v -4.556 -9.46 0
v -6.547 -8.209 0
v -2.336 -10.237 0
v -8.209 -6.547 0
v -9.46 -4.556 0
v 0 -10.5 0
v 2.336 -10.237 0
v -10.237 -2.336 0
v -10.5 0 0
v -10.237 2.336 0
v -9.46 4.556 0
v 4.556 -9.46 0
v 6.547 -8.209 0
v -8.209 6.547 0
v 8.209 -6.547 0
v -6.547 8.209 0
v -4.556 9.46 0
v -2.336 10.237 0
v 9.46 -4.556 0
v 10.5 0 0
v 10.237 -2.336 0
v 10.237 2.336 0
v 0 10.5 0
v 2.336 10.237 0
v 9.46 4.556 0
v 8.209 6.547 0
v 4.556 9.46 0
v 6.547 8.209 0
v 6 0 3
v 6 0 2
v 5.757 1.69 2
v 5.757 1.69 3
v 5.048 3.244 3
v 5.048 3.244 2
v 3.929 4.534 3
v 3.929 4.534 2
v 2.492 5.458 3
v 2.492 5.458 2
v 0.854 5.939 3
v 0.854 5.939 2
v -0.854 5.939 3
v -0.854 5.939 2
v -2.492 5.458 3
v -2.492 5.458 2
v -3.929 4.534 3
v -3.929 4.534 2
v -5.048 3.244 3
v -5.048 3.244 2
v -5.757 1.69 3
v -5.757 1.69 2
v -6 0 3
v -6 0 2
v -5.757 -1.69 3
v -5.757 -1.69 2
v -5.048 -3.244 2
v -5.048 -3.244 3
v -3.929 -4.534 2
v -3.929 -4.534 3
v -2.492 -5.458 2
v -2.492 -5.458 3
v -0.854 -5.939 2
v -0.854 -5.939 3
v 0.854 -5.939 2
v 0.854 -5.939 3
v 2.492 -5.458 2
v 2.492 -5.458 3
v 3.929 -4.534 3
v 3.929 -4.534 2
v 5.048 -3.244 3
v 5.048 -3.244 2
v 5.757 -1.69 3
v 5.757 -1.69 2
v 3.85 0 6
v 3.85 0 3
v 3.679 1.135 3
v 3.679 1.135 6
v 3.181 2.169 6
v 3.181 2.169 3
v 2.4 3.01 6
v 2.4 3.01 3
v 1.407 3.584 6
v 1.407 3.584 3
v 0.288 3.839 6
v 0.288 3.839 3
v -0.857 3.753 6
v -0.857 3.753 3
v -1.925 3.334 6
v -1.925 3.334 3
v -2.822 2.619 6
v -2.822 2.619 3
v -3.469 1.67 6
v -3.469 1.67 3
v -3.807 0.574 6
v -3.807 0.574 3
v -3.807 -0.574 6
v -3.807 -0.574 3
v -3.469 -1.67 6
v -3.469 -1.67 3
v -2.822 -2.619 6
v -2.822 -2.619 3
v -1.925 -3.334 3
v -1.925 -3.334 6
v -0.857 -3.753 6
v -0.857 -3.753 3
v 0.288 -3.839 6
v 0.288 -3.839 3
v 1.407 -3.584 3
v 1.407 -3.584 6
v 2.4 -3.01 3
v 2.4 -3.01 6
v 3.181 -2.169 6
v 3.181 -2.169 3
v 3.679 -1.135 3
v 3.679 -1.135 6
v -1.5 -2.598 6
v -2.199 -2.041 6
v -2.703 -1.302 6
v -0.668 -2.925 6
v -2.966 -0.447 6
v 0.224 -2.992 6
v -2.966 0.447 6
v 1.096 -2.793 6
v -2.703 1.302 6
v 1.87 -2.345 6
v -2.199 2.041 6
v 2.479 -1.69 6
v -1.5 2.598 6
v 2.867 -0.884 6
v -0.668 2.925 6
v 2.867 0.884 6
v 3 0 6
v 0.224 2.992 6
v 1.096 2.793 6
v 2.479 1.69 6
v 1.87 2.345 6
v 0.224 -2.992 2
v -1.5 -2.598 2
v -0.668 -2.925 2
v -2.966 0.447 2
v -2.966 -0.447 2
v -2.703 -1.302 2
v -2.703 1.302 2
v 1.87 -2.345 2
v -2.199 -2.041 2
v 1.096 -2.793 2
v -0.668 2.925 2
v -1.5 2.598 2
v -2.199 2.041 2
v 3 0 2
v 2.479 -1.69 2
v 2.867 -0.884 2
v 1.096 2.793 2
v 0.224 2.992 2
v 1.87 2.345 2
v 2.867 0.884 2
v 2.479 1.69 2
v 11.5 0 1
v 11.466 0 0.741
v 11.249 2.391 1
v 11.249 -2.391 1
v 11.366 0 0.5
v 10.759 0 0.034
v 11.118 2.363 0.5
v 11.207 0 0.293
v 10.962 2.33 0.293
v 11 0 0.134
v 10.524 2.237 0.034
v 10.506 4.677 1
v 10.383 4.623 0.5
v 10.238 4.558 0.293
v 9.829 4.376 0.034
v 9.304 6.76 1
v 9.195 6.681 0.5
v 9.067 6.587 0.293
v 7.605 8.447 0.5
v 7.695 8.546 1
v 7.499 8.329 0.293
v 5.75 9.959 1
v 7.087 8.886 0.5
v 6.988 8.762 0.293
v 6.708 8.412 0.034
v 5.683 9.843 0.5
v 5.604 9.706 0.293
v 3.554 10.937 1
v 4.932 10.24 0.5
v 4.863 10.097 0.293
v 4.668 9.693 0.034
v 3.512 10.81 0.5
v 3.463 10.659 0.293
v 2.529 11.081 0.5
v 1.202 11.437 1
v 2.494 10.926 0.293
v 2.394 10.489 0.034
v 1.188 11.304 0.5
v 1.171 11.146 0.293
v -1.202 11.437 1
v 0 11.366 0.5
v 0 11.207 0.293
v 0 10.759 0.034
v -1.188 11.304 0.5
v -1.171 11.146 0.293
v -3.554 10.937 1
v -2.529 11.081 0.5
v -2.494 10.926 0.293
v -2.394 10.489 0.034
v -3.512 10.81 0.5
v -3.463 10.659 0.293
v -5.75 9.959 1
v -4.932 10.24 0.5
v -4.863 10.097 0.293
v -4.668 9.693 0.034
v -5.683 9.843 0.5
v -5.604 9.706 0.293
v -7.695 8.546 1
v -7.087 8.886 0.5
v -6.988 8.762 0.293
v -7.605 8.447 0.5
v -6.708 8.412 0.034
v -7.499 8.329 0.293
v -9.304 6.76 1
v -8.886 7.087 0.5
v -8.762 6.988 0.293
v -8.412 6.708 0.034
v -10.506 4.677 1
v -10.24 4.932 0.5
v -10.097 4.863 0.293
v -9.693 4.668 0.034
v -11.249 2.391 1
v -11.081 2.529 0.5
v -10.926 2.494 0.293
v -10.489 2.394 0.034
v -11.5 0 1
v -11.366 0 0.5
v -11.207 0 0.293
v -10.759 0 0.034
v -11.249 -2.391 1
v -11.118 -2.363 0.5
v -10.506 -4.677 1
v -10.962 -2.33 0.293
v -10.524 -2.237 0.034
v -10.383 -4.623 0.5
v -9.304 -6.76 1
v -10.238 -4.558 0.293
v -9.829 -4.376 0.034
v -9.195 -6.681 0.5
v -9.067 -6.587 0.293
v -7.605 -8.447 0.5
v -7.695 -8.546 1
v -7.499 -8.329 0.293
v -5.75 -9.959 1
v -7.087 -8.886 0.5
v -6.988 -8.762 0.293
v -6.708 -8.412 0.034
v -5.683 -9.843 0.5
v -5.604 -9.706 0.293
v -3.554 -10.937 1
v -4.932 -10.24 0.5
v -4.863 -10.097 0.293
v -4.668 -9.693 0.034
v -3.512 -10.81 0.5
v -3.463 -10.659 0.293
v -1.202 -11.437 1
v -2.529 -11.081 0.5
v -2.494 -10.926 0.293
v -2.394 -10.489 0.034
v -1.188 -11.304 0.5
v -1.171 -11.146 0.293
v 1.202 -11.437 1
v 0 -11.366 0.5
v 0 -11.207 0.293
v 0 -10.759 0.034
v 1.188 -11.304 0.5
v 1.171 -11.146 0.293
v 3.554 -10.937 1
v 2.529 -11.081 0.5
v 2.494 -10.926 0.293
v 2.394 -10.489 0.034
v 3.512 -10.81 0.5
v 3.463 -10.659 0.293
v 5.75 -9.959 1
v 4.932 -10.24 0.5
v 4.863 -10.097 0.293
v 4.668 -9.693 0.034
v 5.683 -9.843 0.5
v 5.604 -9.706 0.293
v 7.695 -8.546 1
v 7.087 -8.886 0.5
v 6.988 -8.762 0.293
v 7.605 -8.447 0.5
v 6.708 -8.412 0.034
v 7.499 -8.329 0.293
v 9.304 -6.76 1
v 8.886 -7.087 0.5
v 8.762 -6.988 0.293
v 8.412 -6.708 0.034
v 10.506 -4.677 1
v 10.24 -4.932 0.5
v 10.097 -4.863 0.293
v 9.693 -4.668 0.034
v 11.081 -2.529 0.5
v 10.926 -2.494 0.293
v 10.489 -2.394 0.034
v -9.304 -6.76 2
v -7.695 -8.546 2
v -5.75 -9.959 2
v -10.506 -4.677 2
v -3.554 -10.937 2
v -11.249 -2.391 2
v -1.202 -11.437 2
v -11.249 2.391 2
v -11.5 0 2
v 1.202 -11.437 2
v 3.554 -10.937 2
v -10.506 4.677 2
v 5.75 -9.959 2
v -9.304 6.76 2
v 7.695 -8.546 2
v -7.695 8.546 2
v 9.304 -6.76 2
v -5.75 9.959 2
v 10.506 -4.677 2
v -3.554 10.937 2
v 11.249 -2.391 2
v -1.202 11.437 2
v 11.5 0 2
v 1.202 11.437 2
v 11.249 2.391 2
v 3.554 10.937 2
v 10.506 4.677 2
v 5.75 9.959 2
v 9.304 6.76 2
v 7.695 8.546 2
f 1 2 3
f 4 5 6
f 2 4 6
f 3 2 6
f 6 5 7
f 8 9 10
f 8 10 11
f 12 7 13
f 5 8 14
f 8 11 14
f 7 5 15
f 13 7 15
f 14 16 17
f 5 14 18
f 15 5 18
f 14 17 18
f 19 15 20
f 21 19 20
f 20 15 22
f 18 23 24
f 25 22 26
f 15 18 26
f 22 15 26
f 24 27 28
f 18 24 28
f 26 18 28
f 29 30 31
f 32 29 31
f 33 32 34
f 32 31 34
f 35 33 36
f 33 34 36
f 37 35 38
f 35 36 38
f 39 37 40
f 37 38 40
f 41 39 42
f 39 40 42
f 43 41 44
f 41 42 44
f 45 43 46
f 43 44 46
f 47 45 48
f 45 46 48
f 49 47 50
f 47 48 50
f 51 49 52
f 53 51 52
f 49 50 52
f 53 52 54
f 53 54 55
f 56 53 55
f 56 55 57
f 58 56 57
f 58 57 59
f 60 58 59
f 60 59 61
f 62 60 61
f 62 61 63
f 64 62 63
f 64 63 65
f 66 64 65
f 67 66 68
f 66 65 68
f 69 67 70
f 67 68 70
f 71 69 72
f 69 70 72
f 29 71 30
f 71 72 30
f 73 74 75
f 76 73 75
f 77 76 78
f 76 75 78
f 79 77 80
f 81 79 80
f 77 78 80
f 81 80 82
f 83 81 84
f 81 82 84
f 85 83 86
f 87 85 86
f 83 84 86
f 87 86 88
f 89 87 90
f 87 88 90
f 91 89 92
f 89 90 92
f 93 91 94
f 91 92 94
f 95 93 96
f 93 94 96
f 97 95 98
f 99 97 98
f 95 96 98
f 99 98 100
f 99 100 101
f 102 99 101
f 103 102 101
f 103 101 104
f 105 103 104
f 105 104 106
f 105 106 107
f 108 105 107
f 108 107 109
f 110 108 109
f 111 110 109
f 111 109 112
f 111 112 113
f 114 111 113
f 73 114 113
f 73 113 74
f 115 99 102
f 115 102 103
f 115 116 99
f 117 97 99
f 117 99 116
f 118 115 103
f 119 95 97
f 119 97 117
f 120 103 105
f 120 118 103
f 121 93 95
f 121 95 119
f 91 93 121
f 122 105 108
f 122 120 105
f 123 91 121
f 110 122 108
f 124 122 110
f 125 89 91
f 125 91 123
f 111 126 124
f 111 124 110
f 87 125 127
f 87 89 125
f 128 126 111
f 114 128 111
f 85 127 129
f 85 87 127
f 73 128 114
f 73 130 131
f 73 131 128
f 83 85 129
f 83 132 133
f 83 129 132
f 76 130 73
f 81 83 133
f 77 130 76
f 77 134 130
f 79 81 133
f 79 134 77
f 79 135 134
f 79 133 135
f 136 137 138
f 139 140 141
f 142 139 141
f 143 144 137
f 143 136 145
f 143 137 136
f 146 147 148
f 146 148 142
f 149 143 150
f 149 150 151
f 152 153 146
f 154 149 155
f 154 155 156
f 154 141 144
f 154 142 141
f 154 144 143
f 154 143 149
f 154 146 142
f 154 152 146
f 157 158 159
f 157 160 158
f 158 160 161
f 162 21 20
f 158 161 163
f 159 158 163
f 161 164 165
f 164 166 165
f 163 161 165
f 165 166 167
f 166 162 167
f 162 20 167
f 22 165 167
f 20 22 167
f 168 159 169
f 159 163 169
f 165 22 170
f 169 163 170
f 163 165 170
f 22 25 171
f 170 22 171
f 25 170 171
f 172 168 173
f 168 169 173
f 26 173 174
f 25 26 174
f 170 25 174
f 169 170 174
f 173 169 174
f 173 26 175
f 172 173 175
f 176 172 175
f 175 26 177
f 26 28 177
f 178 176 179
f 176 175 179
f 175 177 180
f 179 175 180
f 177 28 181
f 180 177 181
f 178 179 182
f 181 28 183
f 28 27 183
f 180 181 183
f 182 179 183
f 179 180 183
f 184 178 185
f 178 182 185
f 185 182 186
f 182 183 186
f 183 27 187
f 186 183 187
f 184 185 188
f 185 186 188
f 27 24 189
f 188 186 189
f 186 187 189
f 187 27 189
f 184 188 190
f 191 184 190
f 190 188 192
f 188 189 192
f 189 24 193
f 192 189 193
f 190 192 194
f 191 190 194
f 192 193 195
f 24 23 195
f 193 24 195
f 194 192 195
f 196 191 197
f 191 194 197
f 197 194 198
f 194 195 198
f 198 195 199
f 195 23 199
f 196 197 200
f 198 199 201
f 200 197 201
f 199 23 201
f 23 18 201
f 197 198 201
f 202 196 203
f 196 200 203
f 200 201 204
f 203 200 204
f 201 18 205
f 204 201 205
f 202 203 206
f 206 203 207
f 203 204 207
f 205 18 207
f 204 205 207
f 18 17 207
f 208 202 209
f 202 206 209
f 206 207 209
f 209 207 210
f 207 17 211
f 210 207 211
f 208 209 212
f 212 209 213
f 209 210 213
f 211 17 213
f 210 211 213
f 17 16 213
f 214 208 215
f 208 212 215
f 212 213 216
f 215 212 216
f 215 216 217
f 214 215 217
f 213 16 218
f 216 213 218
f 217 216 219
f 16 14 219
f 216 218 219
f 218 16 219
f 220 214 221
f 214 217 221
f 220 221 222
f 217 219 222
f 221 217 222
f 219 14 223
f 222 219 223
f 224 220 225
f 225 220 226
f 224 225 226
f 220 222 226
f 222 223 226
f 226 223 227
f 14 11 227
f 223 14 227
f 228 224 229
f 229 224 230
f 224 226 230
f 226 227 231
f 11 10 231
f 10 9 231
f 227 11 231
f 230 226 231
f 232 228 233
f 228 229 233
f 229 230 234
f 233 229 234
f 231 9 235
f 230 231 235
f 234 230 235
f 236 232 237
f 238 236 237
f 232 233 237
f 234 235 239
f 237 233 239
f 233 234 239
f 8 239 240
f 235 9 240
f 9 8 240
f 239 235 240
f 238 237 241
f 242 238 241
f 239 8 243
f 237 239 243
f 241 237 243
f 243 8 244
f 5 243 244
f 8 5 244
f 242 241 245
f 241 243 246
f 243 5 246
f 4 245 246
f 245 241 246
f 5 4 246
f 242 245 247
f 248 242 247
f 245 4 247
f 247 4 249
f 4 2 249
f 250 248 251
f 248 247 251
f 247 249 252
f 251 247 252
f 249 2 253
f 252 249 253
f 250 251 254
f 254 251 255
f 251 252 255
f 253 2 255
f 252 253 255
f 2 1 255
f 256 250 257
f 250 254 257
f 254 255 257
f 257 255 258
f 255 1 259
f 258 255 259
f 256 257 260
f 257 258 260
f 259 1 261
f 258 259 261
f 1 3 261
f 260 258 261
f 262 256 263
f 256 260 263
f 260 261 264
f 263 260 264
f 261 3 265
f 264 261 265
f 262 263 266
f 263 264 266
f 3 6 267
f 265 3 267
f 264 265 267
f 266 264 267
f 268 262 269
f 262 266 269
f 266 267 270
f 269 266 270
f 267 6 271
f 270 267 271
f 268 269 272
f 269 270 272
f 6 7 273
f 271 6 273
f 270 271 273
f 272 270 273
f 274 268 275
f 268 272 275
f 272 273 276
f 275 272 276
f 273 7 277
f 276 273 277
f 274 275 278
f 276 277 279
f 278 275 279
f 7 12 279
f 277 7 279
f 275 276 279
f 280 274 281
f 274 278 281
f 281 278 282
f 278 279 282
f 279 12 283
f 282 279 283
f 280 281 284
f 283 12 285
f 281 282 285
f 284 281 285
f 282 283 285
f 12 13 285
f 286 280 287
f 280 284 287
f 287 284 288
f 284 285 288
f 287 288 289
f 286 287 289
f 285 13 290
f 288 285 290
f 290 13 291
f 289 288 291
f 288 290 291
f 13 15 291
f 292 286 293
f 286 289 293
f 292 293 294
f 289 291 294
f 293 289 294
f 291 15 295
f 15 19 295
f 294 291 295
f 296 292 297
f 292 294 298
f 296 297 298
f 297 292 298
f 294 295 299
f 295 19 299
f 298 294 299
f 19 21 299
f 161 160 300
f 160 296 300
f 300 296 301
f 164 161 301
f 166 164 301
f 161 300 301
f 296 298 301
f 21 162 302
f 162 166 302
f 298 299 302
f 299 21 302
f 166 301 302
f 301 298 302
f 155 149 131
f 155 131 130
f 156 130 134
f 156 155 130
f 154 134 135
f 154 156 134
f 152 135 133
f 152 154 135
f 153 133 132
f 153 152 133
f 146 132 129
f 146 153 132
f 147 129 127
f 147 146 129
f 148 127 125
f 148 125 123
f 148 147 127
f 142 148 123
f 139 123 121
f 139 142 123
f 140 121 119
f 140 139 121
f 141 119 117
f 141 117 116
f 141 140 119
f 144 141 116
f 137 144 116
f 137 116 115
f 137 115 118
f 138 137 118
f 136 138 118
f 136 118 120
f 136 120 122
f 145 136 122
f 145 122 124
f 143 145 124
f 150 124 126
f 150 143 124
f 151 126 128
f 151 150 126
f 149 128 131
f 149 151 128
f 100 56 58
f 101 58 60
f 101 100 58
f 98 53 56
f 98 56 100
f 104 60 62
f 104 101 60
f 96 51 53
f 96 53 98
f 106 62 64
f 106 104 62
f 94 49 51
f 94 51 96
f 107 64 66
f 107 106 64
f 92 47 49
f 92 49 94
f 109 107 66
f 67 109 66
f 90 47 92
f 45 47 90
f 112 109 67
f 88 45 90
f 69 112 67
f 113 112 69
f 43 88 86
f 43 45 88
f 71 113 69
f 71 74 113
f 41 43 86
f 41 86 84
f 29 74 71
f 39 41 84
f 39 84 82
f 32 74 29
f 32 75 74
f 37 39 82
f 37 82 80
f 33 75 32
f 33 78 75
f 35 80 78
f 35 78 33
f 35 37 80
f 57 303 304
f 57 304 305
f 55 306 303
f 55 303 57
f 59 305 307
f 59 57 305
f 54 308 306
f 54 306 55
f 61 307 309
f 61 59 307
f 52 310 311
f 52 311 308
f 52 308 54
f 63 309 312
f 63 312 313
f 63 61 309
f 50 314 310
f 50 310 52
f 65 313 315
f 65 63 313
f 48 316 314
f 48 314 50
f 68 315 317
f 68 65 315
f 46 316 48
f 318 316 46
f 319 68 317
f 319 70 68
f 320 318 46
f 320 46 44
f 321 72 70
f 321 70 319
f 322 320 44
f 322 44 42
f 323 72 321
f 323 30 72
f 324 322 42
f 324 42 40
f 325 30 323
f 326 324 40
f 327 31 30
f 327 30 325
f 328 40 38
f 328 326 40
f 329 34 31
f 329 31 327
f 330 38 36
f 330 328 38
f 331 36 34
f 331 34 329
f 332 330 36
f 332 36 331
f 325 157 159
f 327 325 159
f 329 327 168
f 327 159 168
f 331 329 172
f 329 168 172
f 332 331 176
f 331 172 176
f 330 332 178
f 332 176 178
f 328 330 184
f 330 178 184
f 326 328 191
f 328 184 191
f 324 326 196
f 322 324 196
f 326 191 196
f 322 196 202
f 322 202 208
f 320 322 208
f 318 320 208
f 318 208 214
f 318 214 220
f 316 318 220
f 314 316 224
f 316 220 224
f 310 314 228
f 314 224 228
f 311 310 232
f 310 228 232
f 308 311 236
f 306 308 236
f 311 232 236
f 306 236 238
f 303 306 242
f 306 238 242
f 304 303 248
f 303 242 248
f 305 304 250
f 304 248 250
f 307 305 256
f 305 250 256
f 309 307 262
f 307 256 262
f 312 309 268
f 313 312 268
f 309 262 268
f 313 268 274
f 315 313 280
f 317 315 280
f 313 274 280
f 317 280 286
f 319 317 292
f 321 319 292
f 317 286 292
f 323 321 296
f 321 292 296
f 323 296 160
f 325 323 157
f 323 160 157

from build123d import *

# Parameters (mm, degrees)
F0_R     = 11.5
F1_DEPTH = 2
F2_R     = 1
F3_R     = 3.85
F3_R_2   = 3
F4_DEPTH = 4
F3_R_3   = 6
F5_DEPTH = 1


with BuildPart() as f1:
    # F0 (on Top) → F1 (new body)
    with BuildSketch(Plane.XY):
        Circle(F0_R)
    extrude(amount=F1_DEPTH)

    # F2
    f2_edges = [f1.edges().sort_by_distance(p)[0] for p in [
        (-11.5, 0, 0),
    ]]
    fillet(f2_edges, radius=F2_R)

    # F3 (on face) → F4 (join)
    with BuildSketch(Plane.XY.offset(2)):
        Circle(F3_R)
        Circle(F3_R_2, mode=Mode.SUBTRACT)
    extrude(amount=F4_DEPTH)

    # F3 (on face) → F5 (join)
    with BuildSketch(Plane.XY.offset(2)):
        Circle(F3_R_3)
        Circle(F3_R, mode=Mode.SUBTRACT)
    extrude(amount=F5_DEPTH)


solid = f1.part
